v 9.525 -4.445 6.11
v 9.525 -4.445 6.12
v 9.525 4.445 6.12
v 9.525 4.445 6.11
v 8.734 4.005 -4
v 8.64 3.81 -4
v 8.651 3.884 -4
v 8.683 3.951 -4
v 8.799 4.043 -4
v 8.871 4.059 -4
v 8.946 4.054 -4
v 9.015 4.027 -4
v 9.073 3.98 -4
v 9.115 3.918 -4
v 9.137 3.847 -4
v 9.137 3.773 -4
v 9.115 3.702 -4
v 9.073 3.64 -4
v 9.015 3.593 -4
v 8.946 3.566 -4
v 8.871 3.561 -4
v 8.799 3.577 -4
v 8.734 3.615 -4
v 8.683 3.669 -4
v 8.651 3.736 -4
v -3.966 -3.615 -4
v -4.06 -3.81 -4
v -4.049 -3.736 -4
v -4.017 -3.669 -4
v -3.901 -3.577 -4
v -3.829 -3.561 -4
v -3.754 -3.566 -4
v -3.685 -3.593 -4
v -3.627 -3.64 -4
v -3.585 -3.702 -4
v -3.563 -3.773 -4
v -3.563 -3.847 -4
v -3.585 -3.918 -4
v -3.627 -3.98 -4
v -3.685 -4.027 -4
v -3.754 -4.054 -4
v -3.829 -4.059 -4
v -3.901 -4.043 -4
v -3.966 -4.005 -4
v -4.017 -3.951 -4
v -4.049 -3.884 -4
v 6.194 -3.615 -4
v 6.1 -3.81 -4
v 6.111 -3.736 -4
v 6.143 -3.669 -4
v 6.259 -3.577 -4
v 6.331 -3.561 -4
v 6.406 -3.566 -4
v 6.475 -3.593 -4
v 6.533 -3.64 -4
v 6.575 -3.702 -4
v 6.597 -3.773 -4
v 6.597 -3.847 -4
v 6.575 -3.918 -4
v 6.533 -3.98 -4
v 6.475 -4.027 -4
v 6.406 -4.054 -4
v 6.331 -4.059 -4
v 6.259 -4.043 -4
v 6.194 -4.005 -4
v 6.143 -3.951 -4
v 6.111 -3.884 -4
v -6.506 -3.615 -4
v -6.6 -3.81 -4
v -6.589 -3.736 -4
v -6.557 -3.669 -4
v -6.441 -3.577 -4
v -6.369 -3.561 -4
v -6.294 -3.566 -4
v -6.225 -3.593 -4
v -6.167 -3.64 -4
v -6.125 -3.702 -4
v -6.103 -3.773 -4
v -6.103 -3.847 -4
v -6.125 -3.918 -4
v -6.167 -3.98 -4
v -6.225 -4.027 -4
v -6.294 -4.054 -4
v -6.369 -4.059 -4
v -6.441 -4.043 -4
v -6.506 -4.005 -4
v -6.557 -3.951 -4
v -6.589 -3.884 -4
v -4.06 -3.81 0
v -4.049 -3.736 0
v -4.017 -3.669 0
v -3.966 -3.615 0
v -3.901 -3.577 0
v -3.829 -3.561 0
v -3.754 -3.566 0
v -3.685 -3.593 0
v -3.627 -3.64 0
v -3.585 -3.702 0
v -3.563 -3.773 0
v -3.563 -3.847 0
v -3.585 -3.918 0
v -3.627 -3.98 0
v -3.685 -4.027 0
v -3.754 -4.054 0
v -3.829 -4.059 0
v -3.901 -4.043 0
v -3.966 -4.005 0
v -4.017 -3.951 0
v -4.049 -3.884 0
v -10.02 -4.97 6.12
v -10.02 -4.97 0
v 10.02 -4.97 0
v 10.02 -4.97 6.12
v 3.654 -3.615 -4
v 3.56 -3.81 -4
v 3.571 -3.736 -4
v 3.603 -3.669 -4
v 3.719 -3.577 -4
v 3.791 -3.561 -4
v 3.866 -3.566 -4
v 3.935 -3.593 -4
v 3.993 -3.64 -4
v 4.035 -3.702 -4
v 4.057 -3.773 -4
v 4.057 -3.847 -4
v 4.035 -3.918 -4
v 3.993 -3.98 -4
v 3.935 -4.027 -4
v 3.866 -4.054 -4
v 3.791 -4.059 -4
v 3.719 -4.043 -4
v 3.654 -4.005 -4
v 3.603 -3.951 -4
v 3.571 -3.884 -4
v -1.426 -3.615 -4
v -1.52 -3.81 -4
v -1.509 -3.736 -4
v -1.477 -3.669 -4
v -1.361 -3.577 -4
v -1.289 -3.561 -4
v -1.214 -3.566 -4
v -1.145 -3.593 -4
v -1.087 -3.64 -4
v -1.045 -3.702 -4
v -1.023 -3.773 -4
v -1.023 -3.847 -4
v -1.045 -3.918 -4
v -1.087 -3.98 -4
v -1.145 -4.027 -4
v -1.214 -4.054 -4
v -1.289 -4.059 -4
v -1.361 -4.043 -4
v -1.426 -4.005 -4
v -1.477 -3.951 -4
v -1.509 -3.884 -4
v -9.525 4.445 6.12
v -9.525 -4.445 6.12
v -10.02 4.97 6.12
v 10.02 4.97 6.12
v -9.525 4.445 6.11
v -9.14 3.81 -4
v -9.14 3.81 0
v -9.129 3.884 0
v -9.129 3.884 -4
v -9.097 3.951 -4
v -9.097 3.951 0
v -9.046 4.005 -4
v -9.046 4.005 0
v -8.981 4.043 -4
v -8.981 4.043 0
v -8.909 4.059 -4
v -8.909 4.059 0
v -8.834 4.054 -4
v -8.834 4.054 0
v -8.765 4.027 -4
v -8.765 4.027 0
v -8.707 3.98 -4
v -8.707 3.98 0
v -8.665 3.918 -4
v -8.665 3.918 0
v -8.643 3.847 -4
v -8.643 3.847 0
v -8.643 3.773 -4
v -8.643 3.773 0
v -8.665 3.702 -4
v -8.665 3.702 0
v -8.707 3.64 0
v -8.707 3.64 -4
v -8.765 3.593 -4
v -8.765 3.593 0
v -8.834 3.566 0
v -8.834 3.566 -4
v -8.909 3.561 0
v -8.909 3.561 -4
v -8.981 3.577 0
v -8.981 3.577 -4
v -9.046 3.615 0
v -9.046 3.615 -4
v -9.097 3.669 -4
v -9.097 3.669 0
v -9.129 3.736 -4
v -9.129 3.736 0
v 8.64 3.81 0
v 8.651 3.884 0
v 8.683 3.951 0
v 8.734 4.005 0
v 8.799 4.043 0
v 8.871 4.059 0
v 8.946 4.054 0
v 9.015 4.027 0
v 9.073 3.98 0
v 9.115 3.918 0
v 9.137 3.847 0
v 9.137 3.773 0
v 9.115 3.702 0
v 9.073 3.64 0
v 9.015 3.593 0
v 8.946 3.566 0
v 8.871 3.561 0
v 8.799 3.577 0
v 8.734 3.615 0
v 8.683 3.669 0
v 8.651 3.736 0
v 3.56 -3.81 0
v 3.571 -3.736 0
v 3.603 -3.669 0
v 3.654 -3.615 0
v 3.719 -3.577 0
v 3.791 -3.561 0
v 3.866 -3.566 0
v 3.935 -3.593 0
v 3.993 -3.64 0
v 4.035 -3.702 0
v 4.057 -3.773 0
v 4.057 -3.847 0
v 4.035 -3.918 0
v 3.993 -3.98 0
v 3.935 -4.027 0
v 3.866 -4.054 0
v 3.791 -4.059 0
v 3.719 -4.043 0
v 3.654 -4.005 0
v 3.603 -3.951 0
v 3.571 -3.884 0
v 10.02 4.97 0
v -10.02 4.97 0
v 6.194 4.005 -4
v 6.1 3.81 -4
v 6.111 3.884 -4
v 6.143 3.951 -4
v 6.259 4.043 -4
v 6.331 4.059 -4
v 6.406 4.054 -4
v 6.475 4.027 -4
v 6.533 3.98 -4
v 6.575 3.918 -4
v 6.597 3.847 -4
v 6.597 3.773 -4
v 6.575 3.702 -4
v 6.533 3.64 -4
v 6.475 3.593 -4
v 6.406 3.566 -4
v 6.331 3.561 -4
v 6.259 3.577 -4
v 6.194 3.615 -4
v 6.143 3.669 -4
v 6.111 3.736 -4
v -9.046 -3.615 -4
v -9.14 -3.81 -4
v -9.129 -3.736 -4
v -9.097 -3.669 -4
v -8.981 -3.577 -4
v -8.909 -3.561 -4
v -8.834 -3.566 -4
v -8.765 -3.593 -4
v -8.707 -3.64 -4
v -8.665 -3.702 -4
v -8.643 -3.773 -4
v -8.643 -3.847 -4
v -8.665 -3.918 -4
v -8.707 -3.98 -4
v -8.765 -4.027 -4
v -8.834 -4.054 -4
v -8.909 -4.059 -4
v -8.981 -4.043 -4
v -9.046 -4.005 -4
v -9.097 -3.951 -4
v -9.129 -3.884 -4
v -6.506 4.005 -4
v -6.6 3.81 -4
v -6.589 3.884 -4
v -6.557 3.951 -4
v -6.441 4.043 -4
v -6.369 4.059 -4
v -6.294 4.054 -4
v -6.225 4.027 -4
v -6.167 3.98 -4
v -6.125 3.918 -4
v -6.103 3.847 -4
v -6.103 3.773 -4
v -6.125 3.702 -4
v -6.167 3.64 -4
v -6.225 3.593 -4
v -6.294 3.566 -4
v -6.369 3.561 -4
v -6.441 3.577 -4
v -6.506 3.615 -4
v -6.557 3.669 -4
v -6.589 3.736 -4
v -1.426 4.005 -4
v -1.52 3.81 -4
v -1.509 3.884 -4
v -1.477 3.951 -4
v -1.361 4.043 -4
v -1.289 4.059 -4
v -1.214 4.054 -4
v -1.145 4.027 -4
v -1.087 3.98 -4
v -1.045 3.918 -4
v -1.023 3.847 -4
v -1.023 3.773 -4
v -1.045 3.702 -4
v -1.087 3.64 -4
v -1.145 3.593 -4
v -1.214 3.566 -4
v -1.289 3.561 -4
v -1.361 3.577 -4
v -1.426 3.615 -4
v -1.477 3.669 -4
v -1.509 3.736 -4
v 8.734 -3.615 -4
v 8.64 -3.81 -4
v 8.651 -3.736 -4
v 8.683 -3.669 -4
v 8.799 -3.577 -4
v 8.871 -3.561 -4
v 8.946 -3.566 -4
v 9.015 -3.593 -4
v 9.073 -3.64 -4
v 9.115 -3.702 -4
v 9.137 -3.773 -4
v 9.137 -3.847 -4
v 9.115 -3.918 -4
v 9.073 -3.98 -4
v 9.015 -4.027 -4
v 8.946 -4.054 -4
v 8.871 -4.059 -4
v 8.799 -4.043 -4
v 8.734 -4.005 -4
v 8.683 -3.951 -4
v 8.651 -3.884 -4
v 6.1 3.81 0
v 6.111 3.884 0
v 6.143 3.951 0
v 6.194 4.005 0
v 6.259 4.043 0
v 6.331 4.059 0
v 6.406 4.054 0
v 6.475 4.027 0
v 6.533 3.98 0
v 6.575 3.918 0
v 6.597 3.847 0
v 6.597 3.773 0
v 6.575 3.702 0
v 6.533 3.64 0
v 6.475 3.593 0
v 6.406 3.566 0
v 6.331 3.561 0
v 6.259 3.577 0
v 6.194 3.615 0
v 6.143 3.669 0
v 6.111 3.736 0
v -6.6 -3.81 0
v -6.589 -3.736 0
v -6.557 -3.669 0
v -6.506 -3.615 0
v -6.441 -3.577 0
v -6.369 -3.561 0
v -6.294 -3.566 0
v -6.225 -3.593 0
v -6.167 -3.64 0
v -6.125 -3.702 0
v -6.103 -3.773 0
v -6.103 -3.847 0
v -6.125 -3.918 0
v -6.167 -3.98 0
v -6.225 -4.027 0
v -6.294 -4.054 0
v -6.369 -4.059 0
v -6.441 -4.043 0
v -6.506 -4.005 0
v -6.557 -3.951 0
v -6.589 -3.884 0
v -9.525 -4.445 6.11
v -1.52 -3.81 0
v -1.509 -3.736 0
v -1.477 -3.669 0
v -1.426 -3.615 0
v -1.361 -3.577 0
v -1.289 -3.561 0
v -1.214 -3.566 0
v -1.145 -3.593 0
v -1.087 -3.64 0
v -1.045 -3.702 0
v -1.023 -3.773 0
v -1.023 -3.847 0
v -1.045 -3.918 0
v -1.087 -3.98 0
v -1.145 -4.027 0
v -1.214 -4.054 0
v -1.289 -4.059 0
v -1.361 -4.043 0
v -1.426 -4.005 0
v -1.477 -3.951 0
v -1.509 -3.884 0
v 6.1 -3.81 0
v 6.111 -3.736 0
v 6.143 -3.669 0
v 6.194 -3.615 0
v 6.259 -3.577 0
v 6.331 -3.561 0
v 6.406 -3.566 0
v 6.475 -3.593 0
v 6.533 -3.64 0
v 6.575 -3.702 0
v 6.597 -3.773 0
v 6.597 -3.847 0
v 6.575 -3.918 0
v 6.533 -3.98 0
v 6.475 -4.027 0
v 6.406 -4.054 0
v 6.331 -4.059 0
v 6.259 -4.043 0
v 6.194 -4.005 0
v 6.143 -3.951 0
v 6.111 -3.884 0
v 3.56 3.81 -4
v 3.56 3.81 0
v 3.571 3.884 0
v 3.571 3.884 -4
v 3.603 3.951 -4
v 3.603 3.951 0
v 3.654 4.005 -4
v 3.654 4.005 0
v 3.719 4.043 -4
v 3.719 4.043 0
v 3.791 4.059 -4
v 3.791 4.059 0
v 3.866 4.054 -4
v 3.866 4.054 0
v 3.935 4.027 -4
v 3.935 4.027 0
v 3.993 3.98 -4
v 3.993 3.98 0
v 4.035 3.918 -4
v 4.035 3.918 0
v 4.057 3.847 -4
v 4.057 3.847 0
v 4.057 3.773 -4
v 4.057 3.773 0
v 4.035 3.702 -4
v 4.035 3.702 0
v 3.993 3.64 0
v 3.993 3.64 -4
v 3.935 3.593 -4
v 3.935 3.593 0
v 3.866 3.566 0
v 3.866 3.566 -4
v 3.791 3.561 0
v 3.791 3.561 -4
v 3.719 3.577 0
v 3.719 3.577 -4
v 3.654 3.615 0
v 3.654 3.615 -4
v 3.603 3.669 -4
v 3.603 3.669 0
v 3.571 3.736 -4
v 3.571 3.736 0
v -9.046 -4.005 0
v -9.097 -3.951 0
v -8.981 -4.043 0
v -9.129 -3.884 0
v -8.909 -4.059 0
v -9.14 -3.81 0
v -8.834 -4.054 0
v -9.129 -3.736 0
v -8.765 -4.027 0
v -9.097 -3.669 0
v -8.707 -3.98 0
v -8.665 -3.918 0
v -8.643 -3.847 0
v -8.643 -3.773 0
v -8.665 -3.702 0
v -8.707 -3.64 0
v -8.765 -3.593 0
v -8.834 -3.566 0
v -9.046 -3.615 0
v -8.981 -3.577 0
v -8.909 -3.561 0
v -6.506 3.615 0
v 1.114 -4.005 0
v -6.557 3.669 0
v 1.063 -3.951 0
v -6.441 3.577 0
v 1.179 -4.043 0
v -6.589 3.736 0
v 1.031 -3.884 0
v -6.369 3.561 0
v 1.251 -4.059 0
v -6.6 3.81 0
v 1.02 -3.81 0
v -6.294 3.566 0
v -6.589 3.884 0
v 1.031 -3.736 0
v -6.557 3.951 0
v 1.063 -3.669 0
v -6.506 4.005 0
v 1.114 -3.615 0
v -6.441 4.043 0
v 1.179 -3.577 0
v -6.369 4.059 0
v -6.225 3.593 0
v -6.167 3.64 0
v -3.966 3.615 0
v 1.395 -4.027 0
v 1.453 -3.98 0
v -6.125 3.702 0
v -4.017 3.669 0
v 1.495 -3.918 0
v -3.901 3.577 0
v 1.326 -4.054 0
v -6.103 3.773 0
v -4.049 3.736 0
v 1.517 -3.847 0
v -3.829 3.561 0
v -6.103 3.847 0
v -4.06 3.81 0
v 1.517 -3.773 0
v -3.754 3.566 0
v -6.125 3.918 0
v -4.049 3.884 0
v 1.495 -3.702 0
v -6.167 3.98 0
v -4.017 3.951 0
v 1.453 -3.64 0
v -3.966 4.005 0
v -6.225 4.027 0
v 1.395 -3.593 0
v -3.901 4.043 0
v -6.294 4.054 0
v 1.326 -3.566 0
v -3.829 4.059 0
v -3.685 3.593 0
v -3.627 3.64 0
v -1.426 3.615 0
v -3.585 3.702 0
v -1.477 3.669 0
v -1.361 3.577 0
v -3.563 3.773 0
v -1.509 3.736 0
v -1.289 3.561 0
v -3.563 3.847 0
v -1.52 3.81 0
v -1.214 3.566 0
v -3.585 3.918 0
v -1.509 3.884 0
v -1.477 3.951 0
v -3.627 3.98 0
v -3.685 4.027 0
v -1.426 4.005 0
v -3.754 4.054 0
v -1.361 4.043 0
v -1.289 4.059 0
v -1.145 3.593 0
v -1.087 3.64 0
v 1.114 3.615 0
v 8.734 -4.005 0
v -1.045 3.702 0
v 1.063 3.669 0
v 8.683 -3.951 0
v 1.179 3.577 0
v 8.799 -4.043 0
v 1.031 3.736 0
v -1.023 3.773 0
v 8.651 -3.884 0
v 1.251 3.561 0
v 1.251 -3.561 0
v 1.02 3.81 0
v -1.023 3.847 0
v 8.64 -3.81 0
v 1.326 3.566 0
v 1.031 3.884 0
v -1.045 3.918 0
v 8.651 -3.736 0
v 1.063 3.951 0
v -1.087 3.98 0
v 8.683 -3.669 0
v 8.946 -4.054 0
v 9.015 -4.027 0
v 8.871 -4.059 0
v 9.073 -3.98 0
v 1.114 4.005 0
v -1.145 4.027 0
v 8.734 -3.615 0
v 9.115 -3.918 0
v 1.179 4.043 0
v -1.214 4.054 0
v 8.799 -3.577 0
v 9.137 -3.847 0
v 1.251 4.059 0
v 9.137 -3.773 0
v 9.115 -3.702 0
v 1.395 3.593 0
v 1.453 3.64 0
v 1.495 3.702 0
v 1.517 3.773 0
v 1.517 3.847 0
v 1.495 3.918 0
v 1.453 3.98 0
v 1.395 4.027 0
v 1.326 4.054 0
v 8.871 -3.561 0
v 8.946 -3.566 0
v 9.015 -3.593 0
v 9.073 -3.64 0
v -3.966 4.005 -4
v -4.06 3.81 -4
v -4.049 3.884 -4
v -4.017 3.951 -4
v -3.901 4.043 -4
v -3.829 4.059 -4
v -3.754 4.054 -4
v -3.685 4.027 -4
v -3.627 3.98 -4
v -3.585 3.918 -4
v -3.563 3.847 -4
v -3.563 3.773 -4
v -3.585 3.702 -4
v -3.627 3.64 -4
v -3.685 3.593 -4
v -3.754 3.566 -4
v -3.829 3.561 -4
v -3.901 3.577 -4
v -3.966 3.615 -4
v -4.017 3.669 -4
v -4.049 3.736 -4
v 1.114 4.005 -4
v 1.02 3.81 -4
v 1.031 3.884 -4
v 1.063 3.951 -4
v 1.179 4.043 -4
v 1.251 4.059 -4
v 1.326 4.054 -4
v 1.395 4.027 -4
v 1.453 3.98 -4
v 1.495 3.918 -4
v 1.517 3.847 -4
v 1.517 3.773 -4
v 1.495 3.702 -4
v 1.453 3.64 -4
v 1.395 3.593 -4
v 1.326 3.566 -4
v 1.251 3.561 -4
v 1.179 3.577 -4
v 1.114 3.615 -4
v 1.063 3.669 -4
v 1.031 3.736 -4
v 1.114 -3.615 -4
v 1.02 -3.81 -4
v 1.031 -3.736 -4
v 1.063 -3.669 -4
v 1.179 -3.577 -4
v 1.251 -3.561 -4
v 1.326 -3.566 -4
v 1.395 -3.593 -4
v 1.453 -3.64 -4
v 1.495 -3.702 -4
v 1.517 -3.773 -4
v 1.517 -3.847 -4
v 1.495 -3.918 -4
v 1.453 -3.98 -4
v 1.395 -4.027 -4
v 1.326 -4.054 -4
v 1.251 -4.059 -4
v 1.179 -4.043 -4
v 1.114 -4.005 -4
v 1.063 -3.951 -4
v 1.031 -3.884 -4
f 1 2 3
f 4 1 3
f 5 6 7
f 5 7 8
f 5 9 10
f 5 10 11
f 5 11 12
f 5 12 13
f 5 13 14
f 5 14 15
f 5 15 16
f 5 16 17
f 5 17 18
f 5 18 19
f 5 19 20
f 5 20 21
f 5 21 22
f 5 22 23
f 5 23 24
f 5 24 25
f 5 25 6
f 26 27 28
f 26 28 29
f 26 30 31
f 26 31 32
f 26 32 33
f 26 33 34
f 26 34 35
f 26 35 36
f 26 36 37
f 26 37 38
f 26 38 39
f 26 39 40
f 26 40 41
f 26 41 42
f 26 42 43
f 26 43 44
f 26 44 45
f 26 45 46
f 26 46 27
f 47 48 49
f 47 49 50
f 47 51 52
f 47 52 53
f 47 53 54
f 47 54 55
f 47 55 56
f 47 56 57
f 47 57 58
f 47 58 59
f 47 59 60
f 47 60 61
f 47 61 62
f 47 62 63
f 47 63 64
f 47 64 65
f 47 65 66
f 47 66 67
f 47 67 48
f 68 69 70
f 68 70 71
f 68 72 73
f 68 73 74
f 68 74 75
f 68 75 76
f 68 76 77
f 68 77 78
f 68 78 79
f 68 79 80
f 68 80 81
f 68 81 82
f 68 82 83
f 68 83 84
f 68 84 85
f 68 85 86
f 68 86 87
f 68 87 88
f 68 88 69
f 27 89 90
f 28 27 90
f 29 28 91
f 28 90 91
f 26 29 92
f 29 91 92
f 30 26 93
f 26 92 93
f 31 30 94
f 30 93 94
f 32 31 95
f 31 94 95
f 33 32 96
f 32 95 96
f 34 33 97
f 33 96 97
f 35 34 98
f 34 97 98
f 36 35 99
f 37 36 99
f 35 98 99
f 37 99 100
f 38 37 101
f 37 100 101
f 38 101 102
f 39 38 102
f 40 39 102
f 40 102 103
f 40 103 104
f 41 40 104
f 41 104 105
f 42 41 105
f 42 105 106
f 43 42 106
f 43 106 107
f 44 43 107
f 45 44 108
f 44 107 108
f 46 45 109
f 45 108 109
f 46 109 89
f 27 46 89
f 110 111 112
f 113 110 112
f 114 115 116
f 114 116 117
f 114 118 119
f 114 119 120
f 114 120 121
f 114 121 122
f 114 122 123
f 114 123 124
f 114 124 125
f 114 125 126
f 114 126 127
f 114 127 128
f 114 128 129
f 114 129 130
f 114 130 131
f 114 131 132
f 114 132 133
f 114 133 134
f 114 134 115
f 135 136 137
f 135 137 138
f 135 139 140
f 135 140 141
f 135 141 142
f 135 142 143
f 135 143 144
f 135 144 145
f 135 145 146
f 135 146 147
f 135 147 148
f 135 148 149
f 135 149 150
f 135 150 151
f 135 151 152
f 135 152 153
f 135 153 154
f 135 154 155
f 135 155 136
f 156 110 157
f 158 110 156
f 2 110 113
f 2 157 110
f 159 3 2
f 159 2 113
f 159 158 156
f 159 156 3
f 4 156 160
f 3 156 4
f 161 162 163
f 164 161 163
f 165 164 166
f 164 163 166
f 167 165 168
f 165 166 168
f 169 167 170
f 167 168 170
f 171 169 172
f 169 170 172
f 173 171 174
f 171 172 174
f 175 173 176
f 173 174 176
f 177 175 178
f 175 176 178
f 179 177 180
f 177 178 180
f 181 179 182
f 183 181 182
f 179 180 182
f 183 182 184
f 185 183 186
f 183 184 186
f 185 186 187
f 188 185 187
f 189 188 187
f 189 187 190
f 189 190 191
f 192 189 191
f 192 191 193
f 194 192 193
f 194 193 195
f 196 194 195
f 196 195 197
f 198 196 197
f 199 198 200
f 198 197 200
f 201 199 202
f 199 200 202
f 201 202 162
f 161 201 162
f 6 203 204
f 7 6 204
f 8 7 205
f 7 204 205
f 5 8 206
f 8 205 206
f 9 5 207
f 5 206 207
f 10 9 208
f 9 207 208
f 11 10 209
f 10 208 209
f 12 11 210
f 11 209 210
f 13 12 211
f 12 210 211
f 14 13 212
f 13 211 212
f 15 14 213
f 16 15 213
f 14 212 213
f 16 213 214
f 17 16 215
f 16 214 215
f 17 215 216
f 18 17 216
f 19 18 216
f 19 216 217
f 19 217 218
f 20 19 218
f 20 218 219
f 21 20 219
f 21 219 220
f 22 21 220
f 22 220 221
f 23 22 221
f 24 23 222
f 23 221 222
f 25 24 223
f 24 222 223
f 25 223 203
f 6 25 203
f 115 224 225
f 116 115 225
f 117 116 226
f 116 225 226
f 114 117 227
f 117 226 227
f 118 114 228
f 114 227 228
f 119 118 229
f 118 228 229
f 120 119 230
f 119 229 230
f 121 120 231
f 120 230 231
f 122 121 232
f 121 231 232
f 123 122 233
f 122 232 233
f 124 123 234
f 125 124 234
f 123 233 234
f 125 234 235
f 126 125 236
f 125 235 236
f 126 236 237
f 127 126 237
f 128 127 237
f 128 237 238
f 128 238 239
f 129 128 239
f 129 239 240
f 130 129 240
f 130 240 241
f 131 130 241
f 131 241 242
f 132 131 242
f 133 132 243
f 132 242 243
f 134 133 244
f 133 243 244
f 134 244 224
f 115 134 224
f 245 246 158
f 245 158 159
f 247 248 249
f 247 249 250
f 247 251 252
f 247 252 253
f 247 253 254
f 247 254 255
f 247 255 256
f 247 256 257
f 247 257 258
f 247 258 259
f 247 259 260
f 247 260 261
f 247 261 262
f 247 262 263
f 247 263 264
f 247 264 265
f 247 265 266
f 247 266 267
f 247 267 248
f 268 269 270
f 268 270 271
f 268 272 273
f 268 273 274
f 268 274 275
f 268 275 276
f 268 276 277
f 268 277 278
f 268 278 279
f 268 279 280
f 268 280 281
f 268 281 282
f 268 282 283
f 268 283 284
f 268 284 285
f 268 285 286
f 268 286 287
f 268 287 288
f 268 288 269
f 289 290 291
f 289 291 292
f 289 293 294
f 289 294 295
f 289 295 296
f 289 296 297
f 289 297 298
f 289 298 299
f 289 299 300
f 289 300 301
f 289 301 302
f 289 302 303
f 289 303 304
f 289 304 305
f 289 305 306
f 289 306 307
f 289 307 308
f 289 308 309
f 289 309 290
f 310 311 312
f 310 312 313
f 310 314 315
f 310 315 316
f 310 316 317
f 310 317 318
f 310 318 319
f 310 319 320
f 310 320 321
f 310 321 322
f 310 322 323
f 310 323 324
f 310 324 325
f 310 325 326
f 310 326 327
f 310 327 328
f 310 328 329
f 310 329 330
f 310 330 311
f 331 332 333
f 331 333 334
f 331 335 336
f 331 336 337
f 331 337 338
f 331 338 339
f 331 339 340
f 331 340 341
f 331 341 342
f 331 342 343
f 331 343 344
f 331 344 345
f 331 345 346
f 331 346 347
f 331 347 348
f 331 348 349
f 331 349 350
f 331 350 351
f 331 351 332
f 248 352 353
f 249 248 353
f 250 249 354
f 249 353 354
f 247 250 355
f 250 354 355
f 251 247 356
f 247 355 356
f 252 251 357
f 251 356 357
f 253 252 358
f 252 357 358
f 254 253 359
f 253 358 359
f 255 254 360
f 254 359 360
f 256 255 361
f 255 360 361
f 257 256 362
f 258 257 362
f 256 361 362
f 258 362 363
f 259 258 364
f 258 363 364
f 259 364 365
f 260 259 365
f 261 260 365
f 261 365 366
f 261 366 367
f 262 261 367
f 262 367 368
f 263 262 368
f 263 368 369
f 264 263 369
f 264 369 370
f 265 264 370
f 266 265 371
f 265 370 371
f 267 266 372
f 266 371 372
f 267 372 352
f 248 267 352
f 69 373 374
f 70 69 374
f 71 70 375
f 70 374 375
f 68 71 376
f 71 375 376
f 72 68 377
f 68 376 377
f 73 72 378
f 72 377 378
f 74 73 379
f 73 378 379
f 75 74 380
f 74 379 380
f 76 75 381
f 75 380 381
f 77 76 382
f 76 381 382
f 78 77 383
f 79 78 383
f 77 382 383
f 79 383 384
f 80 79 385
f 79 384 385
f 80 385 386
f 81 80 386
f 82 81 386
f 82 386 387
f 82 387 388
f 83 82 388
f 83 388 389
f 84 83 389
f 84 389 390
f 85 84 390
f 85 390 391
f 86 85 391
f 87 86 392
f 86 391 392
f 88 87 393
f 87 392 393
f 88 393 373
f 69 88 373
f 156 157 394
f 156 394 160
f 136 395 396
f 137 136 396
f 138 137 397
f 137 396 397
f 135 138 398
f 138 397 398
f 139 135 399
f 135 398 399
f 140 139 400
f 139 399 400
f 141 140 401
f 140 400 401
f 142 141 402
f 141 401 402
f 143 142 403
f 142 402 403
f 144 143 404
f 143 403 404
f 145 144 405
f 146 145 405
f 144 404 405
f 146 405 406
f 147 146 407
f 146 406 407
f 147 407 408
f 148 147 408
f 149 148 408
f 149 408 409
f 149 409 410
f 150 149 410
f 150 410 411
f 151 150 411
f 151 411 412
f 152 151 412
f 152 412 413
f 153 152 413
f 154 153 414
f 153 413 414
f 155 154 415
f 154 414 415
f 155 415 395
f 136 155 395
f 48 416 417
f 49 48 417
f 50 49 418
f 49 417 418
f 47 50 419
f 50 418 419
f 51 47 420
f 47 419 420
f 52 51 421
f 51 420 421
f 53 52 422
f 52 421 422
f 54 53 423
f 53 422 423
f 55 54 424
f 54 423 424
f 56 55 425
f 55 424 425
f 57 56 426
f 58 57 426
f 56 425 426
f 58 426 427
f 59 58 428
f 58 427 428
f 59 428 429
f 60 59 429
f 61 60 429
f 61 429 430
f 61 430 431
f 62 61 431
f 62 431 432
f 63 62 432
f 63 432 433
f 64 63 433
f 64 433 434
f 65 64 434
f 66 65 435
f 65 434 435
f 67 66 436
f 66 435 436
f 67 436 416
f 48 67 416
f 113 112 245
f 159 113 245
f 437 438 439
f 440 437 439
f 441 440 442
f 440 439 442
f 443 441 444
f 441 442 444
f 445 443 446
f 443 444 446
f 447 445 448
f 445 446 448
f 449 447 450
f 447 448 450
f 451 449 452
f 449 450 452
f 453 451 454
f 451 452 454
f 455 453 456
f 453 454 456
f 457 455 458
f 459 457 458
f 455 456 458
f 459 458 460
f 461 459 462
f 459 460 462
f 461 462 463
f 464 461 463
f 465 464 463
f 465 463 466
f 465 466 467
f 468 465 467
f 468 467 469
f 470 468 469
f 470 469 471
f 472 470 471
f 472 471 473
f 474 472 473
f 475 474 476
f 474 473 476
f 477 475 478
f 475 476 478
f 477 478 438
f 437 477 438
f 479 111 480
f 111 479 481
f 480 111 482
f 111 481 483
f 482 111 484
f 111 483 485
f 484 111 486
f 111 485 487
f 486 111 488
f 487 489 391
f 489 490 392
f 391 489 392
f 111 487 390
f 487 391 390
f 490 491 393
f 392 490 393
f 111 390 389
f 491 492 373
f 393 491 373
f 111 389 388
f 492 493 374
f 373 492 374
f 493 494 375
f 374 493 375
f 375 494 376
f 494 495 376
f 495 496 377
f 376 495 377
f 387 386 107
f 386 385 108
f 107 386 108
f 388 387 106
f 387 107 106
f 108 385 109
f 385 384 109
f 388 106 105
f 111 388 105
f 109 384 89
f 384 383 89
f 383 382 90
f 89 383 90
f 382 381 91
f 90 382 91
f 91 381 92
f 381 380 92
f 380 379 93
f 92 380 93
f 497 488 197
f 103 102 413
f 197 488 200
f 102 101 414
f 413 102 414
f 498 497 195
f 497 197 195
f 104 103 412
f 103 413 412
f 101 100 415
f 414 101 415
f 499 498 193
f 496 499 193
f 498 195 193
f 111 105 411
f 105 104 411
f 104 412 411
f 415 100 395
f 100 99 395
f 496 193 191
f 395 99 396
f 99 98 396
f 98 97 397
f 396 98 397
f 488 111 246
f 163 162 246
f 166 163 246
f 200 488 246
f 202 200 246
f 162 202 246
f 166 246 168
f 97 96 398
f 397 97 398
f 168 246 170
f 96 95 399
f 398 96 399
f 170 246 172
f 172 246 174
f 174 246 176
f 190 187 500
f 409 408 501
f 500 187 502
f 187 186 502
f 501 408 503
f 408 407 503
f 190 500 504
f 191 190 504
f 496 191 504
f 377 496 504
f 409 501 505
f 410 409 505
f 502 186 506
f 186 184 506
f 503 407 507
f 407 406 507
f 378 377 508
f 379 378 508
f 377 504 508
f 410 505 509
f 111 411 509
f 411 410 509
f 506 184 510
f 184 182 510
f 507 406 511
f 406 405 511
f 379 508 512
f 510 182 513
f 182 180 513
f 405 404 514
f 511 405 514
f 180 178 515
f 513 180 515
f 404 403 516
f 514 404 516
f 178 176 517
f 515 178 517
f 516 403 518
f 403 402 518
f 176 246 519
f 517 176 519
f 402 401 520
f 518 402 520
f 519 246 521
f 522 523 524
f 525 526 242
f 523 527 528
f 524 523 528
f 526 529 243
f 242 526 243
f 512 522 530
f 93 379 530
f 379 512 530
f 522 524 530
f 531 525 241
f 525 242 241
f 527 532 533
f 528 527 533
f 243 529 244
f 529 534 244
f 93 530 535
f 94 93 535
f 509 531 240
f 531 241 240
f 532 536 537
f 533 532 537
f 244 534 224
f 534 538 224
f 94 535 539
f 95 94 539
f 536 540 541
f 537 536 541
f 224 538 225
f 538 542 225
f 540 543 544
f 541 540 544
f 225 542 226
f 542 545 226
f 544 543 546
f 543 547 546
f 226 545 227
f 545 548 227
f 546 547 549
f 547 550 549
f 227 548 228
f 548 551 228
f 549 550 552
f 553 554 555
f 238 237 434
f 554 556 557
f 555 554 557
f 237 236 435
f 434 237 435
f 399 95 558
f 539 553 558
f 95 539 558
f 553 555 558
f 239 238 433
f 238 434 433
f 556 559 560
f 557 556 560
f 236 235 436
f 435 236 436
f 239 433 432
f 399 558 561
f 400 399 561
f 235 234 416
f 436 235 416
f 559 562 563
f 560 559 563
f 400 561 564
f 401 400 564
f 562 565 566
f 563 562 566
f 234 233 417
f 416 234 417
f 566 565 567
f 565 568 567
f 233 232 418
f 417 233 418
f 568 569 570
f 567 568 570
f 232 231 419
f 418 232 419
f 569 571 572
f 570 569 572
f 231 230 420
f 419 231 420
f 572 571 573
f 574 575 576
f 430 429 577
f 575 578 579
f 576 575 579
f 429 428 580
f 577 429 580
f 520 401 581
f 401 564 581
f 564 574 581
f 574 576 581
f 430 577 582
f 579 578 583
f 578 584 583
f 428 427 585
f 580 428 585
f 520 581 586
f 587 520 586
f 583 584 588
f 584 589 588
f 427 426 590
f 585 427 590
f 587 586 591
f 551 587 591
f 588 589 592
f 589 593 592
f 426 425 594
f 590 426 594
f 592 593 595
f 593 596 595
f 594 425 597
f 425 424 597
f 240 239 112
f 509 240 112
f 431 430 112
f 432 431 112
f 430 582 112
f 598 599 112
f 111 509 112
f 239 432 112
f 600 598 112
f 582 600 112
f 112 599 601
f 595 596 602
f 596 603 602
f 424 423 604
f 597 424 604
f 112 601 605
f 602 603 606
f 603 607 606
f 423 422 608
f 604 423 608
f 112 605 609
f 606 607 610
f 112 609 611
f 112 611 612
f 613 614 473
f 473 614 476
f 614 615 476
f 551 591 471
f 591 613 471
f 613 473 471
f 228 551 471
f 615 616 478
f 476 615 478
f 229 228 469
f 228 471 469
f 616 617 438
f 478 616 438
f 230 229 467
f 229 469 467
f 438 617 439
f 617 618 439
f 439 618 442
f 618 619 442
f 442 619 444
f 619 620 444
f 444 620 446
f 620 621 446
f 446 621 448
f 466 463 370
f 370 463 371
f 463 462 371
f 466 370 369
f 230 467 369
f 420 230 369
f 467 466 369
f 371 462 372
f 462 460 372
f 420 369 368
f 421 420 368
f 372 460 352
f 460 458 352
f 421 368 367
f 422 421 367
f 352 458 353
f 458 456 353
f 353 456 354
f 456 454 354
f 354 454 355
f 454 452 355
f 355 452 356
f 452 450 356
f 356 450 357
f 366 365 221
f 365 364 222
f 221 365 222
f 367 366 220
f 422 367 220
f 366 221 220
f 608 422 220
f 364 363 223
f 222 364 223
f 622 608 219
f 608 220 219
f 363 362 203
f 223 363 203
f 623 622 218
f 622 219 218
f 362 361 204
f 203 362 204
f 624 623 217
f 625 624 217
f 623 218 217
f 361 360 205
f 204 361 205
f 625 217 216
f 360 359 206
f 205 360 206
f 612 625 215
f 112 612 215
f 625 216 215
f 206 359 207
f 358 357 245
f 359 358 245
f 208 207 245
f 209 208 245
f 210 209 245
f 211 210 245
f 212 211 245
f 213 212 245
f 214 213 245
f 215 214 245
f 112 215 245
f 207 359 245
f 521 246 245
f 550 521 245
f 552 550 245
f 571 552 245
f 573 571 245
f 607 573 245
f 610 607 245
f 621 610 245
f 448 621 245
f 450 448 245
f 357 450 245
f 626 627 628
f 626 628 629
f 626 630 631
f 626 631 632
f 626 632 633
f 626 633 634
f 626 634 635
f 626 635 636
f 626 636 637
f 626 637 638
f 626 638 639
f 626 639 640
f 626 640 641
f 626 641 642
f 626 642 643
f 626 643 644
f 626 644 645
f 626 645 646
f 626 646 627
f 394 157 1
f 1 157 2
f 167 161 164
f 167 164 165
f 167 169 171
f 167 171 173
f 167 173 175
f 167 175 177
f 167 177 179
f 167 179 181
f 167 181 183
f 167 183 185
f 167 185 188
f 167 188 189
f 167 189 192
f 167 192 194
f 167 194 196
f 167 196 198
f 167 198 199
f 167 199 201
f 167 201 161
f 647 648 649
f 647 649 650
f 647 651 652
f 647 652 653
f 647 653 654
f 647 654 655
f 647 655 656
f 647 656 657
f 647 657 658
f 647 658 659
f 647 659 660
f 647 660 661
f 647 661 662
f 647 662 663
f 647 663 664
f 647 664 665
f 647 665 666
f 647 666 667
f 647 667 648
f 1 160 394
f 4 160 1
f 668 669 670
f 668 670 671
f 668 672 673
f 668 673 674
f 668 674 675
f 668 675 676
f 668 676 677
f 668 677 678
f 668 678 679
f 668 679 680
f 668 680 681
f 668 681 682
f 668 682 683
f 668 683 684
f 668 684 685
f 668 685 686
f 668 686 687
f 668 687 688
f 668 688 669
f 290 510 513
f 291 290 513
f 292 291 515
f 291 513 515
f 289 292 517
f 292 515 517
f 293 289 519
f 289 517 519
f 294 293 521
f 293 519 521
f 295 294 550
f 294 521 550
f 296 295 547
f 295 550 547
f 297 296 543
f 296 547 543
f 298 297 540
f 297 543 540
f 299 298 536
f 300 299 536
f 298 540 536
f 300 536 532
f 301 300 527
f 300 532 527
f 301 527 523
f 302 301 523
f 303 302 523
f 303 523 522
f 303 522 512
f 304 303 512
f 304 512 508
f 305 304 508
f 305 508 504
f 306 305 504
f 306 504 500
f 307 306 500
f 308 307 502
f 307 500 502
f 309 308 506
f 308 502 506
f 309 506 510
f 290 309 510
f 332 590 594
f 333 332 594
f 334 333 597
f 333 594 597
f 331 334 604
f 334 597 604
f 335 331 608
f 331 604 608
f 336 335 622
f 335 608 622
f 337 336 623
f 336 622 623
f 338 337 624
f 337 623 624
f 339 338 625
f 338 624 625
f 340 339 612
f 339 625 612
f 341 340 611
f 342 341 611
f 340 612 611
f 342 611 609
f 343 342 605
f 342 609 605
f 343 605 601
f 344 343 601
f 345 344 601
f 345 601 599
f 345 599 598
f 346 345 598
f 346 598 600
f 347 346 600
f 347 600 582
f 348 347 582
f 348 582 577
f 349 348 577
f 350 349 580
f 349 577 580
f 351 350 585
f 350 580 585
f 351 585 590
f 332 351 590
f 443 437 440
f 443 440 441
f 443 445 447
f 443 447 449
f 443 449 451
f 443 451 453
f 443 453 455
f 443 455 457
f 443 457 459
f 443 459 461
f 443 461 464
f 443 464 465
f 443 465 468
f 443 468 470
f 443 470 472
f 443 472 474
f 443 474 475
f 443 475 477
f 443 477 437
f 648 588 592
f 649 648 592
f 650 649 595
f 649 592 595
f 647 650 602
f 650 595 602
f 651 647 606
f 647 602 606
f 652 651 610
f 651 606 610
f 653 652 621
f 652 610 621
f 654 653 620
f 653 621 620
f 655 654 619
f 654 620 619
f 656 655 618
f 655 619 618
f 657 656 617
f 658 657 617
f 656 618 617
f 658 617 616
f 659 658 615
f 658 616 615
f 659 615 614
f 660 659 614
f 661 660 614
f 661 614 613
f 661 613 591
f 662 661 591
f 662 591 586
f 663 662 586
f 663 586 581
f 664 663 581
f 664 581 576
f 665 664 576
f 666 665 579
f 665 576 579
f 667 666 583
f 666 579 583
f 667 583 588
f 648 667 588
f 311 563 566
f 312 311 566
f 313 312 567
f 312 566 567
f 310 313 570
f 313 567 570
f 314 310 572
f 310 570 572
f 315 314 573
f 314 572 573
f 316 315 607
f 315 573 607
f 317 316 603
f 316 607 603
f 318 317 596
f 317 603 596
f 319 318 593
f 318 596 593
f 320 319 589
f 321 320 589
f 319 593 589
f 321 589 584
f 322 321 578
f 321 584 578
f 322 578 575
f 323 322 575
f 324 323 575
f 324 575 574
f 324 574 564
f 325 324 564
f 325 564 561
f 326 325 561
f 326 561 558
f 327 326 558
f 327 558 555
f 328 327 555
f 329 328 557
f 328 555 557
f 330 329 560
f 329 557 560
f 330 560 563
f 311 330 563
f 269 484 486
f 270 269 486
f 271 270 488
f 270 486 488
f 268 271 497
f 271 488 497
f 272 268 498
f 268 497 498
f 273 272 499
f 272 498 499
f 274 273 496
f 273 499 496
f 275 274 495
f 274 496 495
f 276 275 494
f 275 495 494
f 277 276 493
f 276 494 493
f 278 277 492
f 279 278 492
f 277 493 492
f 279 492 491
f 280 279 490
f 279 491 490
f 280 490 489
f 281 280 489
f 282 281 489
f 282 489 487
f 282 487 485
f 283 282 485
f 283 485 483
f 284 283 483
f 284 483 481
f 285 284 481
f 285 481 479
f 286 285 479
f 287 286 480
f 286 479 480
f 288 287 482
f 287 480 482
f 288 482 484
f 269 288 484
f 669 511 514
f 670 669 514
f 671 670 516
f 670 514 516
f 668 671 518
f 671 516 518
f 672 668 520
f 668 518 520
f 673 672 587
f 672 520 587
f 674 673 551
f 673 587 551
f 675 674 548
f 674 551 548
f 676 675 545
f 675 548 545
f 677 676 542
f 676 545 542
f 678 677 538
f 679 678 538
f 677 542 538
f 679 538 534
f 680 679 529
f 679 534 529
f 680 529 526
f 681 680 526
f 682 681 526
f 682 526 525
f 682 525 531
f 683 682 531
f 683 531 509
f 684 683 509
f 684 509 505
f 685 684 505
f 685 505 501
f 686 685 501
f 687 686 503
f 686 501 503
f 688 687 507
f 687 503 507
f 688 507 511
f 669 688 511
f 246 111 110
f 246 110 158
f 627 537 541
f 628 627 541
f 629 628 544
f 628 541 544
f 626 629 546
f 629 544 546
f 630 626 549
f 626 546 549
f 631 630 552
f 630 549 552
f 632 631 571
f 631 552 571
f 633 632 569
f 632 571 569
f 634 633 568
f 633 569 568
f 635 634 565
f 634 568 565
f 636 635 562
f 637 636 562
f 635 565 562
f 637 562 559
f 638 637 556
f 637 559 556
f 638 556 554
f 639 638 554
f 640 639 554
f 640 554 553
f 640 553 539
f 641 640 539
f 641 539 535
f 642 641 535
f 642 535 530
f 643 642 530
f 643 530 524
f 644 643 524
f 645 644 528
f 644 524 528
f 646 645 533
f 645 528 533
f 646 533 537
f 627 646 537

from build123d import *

# Parameters (mm, degrees)
SKETCH_1_W                  = 20.04
SKETCH_1_H                  = 9.94
EXTRUDE_1_DEPTH             = 6.12
SKETCH_2_R                  = 0.25
EXTRUDE_2_DEPTH             = 4
PATTERN_LINEAR_1_COUNT      = 8
PATTERN_LINEAR_1_PITCH      = 2.54
PATTERN_LINEAR_1_COUNT_DIR2 = 2
PATTERN_LINEAR_1_PITCH_DIR2 = 7.62
SKETCH_3_W                  = 19.05
SKETCH_3_H                  = 8.89
CUT_EXTRUDE_1_DEPTH         = 0.01


with BuildPart() as part:
    # Эскиз1 → Бобышка-Вытянуть1 (new body)
    with BuildSketch(Plane.XY):
        Rectangle(SKETCH_1_W, SKETCH_1_H)
    extrude(amount=EXTRUDE_1_DEPTH)

    # Эскиз2 → Бобышка-Вытянуть2 (add)
    with BuildSketch(Plane(origin=(0, 0, 0), x_dir=(-1, 0, 0), z_dir=(0, 0, -1))):
        with Locations((8.89, -3.81)):
            Circle(SKETCH_2_R)
    extrude_2 = extrude(amount=EXTRUDE_2_DEPTH)

    # Линейный массив1: Extrude 2 8 × 2
    with Locations(*[(i * PATTERN_LINEAR_1_PITCH, j * PATTERN_LINEAR_1_PITCH_DIR2, 0) for i in range(PATTERN_LINEAR_1_COUNT) for j in range(PATTERN_LINEAR_1_COUNT_DIR2) if (i, j) != (0, 0)]):
        add(extrude_2)

    # Эскиз3 → Вырез-Вытянуть1 (cut)
    with BuildSketch(Plane.XY.offset(6.12)):
        Rectangle(SKETCH_3_W, SKETCH_3_H)
    extrude(amount=-CUT_EXTRUDE_1_DEPTH, mode=Mode.SUBTRACT)


solid = part.part
